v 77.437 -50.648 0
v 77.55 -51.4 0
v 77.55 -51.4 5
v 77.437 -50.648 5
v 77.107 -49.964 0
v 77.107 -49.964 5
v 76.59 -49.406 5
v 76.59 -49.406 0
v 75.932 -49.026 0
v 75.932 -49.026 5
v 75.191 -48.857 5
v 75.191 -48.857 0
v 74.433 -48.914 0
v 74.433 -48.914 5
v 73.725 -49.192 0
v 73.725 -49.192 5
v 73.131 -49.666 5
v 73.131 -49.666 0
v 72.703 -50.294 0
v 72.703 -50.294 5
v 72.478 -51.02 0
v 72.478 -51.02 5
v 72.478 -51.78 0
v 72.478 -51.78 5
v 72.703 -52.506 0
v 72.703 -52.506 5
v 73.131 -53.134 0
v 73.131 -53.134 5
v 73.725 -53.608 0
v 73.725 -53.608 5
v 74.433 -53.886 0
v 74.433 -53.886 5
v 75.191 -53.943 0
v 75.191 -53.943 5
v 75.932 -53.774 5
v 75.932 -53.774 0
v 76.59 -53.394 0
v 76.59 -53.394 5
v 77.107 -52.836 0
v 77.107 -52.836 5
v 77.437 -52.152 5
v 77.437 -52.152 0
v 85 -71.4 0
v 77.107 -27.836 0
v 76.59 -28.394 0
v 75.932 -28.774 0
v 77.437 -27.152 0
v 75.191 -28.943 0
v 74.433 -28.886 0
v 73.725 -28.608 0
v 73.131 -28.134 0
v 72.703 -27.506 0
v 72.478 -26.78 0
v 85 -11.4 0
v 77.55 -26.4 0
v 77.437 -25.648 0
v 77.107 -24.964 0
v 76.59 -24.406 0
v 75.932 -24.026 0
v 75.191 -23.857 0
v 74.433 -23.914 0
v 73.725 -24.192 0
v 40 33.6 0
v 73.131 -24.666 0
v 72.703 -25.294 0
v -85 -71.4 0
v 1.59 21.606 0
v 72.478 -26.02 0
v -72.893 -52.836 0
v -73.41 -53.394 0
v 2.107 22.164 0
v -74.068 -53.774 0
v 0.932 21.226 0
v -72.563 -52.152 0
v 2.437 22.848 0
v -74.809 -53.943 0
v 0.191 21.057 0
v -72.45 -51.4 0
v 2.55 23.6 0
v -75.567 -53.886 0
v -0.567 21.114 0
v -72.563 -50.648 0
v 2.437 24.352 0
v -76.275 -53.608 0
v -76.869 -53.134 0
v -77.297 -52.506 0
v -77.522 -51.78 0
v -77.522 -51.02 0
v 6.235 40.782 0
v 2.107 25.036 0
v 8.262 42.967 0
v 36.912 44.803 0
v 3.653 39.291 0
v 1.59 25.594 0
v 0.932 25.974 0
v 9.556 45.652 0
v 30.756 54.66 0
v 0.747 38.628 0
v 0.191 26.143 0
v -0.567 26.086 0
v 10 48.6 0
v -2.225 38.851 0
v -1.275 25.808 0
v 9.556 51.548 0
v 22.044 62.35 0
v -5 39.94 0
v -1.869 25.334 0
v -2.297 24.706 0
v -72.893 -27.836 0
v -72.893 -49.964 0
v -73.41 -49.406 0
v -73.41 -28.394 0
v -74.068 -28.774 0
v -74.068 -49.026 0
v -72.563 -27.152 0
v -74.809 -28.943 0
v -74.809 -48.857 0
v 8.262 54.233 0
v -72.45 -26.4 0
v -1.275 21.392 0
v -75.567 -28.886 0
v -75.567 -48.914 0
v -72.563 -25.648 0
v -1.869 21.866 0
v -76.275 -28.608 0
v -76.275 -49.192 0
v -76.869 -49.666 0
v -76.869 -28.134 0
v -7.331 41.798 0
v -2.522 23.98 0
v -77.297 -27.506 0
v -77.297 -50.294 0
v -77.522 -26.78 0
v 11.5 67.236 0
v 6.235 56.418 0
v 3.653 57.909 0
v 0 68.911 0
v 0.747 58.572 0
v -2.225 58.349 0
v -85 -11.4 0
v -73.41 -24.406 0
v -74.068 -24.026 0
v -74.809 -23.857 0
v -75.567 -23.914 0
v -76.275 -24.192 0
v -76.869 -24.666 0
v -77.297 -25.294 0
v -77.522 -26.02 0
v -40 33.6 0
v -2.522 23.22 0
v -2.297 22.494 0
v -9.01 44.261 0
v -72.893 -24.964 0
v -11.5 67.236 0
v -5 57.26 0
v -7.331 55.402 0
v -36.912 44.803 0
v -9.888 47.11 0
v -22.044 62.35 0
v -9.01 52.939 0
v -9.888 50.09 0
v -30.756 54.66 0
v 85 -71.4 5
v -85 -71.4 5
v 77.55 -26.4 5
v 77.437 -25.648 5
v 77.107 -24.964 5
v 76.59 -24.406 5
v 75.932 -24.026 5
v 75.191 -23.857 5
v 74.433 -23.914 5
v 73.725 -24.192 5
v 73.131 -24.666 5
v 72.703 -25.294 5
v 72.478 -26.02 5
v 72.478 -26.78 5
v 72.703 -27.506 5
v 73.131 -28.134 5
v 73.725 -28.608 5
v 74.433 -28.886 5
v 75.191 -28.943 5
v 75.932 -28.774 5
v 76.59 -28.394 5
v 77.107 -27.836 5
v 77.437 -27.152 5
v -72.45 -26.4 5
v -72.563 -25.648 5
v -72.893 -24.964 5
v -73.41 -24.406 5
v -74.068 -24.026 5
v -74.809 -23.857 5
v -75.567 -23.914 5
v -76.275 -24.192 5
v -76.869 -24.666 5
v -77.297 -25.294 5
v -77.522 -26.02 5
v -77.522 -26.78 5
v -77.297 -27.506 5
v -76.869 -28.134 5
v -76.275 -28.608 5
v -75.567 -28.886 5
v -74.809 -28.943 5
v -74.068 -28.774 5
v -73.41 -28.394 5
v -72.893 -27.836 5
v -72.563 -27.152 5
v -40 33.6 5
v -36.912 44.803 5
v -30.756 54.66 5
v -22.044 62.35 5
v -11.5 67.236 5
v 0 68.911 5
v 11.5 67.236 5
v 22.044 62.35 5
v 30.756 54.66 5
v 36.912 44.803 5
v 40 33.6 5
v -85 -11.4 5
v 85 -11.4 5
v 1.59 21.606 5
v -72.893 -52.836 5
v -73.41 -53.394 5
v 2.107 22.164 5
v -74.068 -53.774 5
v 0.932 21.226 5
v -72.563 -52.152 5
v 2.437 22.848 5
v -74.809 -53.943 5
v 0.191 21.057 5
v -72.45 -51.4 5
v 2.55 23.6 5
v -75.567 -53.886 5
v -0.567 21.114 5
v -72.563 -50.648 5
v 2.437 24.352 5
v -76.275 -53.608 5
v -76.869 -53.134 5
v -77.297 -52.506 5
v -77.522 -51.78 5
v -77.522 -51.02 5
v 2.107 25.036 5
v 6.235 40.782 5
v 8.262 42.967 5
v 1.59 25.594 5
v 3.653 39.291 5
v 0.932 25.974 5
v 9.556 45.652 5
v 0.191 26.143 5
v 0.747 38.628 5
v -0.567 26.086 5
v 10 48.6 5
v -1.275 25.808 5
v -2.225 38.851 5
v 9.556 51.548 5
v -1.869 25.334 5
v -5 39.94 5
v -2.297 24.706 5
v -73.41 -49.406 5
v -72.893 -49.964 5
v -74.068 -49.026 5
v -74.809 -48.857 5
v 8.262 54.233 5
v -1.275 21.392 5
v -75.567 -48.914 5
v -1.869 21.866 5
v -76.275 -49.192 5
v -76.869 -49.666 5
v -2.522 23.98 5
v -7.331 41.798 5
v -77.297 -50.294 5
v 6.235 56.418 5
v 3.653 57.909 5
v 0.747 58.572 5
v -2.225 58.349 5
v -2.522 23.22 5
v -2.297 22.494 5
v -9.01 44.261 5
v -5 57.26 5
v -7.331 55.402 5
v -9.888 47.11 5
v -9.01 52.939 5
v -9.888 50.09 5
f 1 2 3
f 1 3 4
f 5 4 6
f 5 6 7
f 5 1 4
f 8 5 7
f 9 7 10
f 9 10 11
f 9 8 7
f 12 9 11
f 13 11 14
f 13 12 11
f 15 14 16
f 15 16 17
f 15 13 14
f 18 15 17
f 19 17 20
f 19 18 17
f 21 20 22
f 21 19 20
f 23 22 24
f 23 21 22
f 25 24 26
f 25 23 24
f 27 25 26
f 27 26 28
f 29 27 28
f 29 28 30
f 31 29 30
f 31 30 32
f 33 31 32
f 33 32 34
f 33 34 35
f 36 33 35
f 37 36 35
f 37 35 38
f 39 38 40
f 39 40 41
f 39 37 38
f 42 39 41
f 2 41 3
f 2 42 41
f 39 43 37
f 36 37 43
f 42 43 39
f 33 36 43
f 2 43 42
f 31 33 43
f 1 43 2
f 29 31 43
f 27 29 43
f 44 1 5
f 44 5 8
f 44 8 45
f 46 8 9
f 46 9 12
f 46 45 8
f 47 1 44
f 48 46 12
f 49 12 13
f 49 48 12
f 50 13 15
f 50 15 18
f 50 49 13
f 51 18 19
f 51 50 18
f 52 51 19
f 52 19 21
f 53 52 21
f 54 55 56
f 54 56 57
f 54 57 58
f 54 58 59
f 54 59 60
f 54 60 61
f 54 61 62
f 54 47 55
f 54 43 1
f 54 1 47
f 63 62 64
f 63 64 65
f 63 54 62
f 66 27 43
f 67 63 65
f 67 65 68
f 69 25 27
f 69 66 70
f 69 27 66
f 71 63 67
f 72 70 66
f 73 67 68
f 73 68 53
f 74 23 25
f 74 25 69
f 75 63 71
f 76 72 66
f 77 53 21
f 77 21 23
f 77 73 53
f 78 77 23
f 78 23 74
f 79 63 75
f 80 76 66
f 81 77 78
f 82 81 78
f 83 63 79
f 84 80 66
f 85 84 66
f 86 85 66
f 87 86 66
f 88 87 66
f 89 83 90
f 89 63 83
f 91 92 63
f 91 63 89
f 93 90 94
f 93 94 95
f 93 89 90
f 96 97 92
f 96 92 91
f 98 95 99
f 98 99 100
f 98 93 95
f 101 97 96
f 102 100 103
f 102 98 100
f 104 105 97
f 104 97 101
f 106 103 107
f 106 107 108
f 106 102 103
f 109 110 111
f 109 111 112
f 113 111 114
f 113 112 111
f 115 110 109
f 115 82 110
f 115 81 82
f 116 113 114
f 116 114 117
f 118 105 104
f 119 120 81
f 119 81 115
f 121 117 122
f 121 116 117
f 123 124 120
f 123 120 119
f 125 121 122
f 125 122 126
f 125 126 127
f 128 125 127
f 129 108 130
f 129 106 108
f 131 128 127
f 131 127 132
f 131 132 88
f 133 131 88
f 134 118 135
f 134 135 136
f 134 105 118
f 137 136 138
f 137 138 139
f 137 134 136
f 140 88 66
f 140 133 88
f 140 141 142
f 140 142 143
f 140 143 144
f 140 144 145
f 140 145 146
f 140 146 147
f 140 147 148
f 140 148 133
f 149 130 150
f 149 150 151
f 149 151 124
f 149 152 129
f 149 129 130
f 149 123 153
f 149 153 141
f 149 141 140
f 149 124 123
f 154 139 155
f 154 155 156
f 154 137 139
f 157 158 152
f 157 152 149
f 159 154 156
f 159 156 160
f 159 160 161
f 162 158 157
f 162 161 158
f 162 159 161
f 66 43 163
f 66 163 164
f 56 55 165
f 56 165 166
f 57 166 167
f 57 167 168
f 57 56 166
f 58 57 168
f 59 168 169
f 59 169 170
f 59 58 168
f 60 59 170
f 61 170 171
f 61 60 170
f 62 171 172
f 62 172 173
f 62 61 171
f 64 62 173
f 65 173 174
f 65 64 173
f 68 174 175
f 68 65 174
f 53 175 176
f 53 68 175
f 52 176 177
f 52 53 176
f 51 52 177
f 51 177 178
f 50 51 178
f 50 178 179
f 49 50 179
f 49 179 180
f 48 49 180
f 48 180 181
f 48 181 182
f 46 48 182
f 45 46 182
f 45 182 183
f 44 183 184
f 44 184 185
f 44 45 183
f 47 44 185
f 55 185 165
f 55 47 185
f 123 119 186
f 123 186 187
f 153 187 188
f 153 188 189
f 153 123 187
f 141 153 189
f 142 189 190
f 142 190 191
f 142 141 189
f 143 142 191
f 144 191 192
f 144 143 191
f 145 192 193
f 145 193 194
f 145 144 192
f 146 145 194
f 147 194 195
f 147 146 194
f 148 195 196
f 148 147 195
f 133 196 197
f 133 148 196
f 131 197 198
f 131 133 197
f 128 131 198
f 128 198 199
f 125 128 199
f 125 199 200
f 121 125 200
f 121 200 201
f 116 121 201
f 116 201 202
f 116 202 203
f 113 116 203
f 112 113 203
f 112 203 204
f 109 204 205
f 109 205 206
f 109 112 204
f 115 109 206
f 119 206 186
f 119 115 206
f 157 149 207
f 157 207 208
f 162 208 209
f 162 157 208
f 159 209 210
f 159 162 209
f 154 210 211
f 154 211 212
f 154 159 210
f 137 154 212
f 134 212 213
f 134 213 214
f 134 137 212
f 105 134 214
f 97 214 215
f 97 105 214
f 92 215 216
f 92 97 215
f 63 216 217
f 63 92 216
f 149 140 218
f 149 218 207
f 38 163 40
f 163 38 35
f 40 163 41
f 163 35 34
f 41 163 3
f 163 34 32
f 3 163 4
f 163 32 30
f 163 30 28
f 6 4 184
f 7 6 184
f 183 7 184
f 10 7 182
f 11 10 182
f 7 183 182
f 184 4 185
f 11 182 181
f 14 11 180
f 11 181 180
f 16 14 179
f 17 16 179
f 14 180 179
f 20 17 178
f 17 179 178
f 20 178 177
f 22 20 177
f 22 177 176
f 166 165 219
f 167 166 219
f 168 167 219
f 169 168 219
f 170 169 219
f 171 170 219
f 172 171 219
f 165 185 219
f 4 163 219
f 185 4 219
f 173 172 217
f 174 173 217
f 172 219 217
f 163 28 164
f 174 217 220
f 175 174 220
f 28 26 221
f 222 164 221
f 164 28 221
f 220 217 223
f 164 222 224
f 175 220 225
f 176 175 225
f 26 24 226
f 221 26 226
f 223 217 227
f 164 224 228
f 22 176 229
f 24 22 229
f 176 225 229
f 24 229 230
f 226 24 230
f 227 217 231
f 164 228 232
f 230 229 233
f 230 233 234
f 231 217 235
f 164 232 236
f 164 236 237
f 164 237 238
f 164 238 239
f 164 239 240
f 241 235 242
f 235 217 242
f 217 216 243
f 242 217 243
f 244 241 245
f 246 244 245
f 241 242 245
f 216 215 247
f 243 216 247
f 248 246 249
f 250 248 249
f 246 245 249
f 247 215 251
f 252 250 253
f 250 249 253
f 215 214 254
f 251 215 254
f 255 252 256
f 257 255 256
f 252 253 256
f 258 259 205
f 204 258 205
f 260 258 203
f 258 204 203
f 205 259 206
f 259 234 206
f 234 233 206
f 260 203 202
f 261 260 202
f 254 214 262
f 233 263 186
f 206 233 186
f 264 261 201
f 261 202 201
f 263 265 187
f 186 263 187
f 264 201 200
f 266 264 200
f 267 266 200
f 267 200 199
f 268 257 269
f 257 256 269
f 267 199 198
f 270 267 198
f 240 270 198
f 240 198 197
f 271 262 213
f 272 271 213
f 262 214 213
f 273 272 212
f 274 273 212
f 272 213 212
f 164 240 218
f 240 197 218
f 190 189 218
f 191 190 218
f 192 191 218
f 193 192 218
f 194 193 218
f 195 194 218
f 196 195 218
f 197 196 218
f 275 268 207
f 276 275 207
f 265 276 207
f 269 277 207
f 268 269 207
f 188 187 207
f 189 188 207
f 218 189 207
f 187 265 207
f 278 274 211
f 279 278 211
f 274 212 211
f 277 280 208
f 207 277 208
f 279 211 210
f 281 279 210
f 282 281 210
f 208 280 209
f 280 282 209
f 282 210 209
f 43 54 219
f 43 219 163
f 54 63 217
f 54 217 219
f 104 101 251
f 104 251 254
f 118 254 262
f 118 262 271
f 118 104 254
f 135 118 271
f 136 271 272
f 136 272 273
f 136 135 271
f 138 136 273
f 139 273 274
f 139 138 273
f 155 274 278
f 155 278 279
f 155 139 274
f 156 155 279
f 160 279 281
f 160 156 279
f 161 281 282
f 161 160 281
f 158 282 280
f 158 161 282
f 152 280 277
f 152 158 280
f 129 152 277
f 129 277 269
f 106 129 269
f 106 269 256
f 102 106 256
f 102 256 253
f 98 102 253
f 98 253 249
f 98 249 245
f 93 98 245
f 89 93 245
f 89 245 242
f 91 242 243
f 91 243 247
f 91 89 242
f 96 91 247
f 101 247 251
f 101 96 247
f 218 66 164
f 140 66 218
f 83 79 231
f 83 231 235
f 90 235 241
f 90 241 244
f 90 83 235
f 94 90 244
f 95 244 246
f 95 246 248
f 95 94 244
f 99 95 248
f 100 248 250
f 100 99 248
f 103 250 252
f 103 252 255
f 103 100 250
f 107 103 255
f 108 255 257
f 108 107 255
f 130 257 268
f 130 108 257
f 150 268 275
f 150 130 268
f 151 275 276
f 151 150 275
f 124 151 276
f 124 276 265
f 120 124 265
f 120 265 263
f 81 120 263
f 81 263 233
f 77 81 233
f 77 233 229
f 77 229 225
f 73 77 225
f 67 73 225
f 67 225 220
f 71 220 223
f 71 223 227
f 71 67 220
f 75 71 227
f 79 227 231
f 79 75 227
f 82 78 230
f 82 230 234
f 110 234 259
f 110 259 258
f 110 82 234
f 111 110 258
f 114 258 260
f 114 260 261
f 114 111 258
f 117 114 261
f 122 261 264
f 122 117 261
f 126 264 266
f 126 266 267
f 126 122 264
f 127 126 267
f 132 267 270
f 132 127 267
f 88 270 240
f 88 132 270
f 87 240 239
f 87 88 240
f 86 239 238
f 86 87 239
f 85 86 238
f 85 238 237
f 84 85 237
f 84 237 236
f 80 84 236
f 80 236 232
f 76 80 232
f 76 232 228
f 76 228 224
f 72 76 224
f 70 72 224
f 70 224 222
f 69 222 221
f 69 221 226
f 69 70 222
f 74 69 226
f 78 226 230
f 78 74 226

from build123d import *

# Parameters (mm, degrees)
SKETCH_1_R      = 2.55
SKETCH_1_R_2    = 10
EXTRUDE_1_DEPTH = 5


with BuildPart() as part:
    # ｽｹｯﾁ1 → ﾎﾞｽ - 押し出し1 (new body)
    with BuildSketch(Plane.XY):
        with BuildLine():
            Line((-85, -71.4), (-85, -11.4))
            Line((-85, -11.4), (-40, 33.6))
            ThreePointArc((-40, 33.6), (0, 68.911288741), (40, 33.6))
            Line((40, 33.6), (85, -11.4))
            Line((85, -11.4), (85, -71.4))
            Line((85, -71.4), (-85, -71.4))
        make_face()
        with Locations((75, -26.4)):
            Circle(SKETCH_1_R, mode=Mode.SUBTRACT)
        with Locations((75, -51.4)):
            Circle(SKETCH_1_R, mode=Mode.SUBTRACT)
        with Locations((-75, -26.4)):
            Circle(SKETCH_1_R, mode=Mode.SUBTRACT)
        with Locations((-75, -51.4)):
            Circle(SKETCH_1_R, mode=Mode.SUBTRACT)
        with Locations((0, 23.6)):
            Circle(SKETCH_1_R, mode=Mode.SUBTRACT)
        with Locations((0, 48.6)):
            Circle(SKETCH_1_R_2, mode=Mode.SUBTRACT)
    extrude(amount=EXTRUDE_1_DEPTH)


solid = part.part
